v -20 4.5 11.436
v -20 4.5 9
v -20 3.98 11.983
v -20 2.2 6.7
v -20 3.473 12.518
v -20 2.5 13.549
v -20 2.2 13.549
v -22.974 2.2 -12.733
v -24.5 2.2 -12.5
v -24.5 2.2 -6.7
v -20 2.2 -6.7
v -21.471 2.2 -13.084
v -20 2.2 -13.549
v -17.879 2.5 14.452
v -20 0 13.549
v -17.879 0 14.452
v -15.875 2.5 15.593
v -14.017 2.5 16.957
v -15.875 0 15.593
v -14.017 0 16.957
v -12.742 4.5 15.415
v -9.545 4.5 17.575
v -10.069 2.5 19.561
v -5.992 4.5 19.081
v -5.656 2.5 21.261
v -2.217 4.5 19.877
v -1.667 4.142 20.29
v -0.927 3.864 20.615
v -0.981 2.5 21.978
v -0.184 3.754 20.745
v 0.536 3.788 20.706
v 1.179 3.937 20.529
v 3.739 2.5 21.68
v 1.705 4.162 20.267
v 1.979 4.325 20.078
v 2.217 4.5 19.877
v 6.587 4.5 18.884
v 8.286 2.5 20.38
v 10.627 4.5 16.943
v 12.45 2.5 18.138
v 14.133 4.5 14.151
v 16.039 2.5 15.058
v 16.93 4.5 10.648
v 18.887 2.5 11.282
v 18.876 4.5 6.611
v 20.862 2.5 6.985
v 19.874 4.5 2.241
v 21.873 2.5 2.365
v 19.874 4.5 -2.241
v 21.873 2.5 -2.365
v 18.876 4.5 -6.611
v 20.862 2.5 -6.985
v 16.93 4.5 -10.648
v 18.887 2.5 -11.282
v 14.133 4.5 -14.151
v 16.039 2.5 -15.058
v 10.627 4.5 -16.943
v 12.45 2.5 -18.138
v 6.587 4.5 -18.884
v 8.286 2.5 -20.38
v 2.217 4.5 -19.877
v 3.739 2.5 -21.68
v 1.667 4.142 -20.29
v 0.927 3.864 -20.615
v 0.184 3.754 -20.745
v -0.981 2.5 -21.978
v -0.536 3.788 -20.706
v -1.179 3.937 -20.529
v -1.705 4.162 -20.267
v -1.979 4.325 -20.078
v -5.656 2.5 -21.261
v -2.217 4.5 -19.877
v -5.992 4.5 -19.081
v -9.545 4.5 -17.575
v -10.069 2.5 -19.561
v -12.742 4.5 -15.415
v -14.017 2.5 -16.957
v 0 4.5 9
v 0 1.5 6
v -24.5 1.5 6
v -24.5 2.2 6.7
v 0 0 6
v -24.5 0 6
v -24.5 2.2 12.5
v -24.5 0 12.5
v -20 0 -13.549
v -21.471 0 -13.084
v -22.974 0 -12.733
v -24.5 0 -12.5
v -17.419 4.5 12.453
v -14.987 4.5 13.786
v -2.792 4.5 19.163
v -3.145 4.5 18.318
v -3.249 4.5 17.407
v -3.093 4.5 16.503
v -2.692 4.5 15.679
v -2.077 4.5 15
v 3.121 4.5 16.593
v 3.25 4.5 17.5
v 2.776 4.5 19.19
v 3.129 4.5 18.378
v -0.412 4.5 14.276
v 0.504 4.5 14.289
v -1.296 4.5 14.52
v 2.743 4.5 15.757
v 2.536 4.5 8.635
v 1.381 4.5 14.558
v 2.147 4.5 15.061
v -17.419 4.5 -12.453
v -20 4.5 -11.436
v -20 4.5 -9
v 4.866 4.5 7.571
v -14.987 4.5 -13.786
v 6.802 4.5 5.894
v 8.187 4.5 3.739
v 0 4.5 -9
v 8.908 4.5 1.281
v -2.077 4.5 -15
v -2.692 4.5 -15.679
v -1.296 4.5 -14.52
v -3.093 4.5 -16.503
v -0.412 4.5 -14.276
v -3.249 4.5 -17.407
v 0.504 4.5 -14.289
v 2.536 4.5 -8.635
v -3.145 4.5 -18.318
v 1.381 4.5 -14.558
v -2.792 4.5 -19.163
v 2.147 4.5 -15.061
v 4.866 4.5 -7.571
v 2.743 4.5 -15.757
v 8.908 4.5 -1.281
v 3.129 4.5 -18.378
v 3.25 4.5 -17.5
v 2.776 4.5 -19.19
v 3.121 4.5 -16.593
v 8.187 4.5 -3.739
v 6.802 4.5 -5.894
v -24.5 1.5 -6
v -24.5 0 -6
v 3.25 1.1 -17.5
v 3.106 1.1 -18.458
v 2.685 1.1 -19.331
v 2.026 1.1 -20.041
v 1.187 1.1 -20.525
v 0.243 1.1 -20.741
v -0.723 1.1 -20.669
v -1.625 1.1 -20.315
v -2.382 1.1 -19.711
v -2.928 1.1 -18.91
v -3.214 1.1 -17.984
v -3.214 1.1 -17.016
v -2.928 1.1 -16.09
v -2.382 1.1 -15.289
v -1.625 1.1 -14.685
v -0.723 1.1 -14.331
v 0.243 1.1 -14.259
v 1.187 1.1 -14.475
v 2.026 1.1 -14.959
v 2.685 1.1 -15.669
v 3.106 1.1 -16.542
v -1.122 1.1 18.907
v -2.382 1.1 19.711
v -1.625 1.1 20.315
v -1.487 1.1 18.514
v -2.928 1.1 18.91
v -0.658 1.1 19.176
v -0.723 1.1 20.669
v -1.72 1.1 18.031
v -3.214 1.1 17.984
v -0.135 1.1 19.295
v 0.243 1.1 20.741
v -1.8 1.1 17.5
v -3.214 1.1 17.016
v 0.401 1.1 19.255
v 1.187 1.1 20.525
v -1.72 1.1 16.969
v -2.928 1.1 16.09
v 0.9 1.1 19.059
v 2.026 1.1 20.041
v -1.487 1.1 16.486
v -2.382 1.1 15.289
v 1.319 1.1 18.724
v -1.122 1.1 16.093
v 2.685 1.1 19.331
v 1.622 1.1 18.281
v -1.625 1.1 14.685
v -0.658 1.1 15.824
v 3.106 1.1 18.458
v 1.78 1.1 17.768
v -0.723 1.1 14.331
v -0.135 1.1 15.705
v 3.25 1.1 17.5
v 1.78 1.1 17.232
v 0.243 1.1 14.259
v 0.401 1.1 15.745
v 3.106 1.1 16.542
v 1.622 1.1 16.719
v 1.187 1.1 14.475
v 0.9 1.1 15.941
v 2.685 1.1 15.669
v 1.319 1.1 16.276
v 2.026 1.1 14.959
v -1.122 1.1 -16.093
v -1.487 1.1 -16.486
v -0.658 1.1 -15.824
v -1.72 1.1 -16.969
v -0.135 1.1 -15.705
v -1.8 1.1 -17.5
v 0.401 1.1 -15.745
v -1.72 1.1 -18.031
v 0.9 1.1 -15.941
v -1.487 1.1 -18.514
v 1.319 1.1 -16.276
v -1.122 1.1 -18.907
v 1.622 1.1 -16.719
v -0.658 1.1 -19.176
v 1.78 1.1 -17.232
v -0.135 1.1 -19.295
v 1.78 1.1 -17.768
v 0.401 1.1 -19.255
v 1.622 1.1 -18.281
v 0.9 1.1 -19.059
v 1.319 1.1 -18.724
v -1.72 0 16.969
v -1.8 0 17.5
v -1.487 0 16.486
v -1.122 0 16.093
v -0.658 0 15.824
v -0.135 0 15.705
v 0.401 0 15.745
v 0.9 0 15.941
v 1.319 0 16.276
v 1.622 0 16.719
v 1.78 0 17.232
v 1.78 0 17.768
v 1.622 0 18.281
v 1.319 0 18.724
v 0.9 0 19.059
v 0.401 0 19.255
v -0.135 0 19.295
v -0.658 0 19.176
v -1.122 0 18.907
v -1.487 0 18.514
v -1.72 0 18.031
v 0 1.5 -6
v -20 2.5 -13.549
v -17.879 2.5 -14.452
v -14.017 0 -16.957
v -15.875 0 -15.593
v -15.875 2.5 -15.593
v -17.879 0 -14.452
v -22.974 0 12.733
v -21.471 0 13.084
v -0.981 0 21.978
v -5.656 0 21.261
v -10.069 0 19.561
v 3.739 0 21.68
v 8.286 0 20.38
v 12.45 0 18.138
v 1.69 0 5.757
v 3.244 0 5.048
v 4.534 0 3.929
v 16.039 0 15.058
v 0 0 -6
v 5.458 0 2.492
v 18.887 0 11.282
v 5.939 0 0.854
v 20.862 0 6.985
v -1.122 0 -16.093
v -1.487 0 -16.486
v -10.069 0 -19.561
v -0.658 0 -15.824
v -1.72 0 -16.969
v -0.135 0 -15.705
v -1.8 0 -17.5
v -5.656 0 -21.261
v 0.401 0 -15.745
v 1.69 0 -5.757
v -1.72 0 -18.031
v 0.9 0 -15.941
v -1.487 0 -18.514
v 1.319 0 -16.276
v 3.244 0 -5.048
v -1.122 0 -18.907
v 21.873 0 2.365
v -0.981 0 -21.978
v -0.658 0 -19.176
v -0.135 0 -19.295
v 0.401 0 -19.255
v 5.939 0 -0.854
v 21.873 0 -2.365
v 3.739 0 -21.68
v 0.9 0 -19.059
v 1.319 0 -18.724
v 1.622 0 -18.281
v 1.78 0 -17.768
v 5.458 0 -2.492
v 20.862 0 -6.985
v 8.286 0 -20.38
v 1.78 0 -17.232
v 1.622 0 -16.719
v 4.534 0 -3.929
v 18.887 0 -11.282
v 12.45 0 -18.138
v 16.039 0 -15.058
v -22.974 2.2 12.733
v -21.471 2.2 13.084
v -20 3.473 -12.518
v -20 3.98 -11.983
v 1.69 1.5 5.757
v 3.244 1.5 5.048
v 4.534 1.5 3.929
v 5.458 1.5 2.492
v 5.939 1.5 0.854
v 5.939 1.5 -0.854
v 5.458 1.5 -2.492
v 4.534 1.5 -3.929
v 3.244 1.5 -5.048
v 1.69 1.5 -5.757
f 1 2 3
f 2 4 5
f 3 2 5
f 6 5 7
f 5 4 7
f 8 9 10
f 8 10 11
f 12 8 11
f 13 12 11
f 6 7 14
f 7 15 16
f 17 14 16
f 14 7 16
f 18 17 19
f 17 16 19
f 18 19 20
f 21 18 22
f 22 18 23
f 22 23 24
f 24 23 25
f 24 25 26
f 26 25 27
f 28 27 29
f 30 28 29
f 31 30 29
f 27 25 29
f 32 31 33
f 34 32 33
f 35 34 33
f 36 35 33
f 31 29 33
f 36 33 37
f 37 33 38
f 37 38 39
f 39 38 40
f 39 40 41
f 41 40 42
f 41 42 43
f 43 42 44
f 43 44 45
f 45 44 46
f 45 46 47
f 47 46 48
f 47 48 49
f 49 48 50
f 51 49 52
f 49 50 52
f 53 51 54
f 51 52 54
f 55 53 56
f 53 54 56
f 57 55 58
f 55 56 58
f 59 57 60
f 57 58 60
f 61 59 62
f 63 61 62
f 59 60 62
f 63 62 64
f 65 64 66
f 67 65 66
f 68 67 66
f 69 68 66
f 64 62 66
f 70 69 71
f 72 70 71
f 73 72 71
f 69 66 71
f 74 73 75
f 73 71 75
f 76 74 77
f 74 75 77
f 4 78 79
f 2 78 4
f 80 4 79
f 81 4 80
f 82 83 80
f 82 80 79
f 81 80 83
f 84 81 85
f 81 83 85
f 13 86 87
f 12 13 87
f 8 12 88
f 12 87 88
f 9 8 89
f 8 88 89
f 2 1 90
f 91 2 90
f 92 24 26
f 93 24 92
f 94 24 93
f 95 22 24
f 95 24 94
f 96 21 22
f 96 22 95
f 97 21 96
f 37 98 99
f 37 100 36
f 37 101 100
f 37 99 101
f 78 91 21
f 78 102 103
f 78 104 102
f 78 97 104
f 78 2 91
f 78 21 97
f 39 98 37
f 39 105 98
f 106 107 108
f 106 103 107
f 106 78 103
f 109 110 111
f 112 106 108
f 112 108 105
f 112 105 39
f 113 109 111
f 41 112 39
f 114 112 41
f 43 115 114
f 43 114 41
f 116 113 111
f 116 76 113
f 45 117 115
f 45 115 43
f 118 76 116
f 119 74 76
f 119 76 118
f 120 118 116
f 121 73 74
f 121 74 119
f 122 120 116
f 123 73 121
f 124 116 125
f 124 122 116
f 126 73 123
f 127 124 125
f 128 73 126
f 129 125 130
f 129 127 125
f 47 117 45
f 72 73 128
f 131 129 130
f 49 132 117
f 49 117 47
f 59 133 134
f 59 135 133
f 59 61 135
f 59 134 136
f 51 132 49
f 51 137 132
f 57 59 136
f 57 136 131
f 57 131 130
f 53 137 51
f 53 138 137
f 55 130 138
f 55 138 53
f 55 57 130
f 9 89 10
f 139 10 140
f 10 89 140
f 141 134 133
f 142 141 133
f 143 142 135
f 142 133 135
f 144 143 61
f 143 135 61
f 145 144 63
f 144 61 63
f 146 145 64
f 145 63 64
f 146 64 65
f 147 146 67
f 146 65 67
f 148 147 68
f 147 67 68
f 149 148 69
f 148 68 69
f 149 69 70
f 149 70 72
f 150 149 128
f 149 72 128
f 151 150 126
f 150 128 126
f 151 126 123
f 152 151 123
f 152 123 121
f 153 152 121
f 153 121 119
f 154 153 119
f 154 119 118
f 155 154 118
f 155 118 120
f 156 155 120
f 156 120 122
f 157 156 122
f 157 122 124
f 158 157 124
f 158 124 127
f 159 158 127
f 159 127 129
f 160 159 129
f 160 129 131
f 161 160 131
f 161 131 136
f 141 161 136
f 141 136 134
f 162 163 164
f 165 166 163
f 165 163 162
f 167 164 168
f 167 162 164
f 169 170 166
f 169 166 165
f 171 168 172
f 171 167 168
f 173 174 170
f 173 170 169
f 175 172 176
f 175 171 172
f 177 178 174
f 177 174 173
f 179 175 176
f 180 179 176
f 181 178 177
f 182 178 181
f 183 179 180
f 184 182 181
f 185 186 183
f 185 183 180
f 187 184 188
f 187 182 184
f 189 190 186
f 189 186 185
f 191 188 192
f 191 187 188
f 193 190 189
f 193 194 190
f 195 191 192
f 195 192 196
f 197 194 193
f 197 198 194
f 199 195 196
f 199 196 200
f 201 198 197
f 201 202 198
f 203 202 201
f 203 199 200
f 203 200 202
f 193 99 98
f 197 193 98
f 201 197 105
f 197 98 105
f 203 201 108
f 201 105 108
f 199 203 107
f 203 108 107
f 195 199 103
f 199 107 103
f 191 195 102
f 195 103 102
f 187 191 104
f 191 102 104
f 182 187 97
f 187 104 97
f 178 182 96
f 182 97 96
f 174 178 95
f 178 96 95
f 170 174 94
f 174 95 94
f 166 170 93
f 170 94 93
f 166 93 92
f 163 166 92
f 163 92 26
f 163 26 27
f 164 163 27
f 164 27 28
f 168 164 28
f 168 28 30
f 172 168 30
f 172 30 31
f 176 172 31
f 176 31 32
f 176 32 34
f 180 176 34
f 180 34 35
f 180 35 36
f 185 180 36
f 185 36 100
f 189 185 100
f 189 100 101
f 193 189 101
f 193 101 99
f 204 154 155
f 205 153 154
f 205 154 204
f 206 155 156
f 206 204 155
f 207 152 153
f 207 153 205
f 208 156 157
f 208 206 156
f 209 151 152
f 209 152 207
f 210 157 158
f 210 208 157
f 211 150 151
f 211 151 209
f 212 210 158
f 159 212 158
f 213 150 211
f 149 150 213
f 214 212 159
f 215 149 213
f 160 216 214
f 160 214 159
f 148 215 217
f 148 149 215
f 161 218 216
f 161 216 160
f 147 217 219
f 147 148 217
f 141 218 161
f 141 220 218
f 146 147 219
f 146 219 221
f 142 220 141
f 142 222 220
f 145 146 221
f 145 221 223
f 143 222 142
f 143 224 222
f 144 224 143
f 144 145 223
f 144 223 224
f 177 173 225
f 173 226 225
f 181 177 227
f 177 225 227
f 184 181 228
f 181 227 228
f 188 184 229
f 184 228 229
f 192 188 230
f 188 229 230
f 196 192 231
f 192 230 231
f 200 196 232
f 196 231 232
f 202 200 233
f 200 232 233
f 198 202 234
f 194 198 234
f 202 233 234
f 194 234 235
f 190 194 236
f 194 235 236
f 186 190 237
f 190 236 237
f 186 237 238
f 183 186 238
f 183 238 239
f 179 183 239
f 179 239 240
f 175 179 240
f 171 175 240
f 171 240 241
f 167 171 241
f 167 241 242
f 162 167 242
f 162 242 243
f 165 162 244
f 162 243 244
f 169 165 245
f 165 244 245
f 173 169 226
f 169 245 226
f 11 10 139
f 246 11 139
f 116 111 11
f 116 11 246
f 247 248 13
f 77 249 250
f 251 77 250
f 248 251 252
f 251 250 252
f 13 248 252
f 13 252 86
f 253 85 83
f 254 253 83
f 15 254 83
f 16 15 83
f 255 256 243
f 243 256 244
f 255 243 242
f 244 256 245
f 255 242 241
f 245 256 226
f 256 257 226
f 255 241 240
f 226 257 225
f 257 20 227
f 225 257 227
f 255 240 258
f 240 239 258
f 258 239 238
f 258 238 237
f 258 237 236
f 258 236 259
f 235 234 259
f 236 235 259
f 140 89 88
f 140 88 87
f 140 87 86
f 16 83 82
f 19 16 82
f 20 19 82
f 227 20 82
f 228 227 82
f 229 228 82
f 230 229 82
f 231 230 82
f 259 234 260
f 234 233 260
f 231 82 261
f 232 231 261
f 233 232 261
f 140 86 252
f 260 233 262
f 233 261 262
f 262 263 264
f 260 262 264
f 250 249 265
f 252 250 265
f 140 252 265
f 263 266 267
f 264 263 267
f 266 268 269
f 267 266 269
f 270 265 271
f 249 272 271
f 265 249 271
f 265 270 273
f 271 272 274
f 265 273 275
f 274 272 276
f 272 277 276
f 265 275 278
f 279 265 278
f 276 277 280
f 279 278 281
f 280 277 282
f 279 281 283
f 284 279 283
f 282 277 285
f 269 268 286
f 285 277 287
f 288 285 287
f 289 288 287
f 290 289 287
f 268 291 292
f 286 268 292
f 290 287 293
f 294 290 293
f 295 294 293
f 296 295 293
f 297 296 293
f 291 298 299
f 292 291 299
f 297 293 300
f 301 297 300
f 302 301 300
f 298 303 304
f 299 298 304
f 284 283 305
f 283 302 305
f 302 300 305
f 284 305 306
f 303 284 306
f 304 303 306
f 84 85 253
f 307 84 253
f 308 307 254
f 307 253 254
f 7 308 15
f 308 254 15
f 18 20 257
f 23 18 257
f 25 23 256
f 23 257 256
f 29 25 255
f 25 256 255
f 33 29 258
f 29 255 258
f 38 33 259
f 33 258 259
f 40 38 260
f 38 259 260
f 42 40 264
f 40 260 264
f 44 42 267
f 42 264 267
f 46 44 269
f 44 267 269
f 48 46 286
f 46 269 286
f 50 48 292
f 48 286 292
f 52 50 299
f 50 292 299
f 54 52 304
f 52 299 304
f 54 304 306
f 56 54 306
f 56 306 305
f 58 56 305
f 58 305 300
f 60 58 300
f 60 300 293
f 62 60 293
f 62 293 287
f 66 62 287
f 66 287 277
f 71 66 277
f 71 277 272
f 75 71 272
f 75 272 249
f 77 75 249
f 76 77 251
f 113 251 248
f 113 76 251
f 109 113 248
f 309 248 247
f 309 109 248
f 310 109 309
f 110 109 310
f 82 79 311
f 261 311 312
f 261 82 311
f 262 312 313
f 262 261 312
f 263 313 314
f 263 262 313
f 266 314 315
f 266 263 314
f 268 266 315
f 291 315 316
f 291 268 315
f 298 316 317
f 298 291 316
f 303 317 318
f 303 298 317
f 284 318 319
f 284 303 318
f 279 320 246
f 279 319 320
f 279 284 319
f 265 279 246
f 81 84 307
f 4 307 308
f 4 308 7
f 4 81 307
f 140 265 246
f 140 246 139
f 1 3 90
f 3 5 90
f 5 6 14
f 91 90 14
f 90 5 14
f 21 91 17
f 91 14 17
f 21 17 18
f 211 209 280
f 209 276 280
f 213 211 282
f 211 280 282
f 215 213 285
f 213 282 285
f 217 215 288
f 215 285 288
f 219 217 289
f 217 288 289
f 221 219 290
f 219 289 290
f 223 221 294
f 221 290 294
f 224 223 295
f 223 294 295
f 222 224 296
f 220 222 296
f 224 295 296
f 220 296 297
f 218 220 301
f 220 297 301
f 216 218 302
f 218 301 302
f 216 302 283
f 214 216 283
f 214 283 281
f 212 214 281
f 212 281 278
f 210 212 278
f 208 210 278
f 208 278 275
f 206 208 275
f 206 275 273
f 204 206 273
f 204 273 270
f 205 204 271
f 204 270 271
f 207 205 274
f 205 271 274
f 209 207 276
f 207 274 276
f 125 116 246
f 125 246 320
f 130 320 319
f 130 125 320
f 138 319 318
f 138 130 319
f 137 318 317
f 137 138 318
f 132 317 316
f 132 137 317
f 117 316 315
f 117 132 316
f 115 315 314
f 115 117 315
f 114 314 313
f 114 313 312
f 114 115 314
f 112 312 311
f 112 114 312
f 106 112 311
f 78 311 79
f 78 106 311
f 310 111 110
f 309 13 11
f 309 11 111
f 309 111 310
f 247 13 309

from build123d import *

# Parameters (mm, degrees)
BOSS_EXTRUDE1_DEPTH                                 = 4.5
CUT_EXTRUDE1_DEPTH                                  = 43.552908244
CUT_EXTRUDE1_DEPTH_BACK                             = 43.552908244
SKETCH2_W                                           = 4.5
SKETCH2_H                                           = 2.3
CUT_EXTRUDE2_DEPTH                                  = 34.234018716
CUT_EXTRUDE2_DEPTH_BACK                             = 34.234018716
CBORE_FOR_M3_HEX_SOCKET_HEAD_CAP_SCREW1_D           = 3.6
CBORE_FOR_M3_HEX_SOCKET_HEAD_CAP_SCREW1_CBORE_D     = 6.5
CBORE_FOR_M3_HEX_SOCKET_HEAD_CAP_SCREW1_CBORE_DEPTH = 3.4
FILLET2_DEPTH                                       = 4.5
FILLET2_2_DEPTH                                     = 2.2
CHAMFER1_SIZE                                       = 3
CHAMFER2_SIZE                                       = 2


with BuildPart() as part:
    # Sketch1 → Boss-Extrude1 (new body)
    with BuildSketch(Plane(origin=(0, 0, 0), x_dir=(1, 0, 0), z_dir=(0, 1, 0))):
        with BuildLine():
            Line((-18.10386699, 12.5), (-24.5, 12.5))
            Line((-24.5, 12.5), (-24.5, -12.5))
            Line((-24.5, -12.5), (-18.10386699, -12.5))
            ThreePointArc((-18.10386699, -12.5), (22, 0), (-18.10386699, 12.5))
        make_face()
    extrude(amount=BOSS_EXTRUDE1_DEPTH)

    # Sketch2 → Cut-Extrude1 (cut, two sides: drawn at the far end of the back side and taken through both)
    with BuildSketch(Plane.XY.offset(12.5).offset(-CUT_EXTRUDE1_DEPTH_BACK)):
        with Locations((-22.25, 3.35)):
            Rectangle(SKETCH2_W, SKETCH2_H)
    extrude(amount=CUT_EXTRUDE1_DEPTH + CUT_EXTRUDE1_DEPTH_BACK, mode=Mode.SUBTRACT)

    # Sketch3 → Cut-Extrude2 (cut, two sides: drawn at the far end of the back side and taken through both)
    with BuildSketch(Plane(origin=(0, 4.5, 0), x_dir=(1, 0, 0), z_dir=(0, 1, 0)).offset(-CUT_EXTRUDE2_DEPTH_BACK)):
        with BuildLine():
            Line((0, 6), (-24.5, 6))
            Line((-24.5, 6), (-24.5, -6))
            Line((-24.5, -6), (0, -6))
            ThreePointArc((0, -6), (6, 0), (0, 6))
        make_face()
    extrude(amount=CUT_EXTRUDE2_DEPTH + CUT_EXTRUDE2_DEPTH_BACK, mode=Mode.SUBTRACT)

    # CBORE for M3 Hex Socket Head Cap Screw1 (through all)
    with Locations(Plane(origin=(0, 4.5, 0), x_dir=(1, 0, 0), z_dir=(0, 1, 0))):
        with Locations((0, -17.5), (0, 17.5)):
            CounterBoreHole(CBORE_FOR_M3_HEX_SOCKET_HEAD_CAP_SCREW1_D / 2, CBORE_FOR_M3_HEX_SOCKET_HEAD_CAP_SCREW1_CBORE_D / 2, CBORE_FOR_M3_HEX_SOCKET_HEAD_CAP_SCREW1_CBORE_DEPTH)

    # Fillet2: read off the stored shape, not the designer's step
    # Fillet2 outline → Fillet2 (add)
    with BuildSketch(Plane(origin=(0, 0, 0), x_dir=(1, 0, 0), z_dir=(0, 1, 0))):
        with BuildLine():
            Line((-18.10386699, -12.5), (-20, -12.5))
            Line((-20, -12.5), (-20, -13.548778219))
            ThreePointArc((-20, -13.548778219), (-16.860589429, -14.993334166), (-14.016717362, -16.956757779))
            ThreePointArc((-14.016717362, -16.956757779), (-16.214149909, -14.869476882), (-18.10386699, -12.5))
        make_face()
        with BuildLine():
            ThreePointArc((-18.10386699, 12.5), (-16.214149909, 14.869476882), (-14.016717362, 16.956757779))
            ThreePointArc((-14.016717362, 16.956757779), (-16.860589429, 14.993334166), (-20, 13.548778219))
            Line((-20, 13.548778219), (-20, 12.5))
            Line((-20, 12.5), (-18.10386699, 12.5))
        make_face()
    extrude(amount=FILLET2_DEPTH)

    # Fillet2 2 outline → Fillet2 2 (add)
    with BuildSketch(Plane(origin=(0, 0, 0), x_dir=(1, 0, 0), z_dir=(0, 1, 0))):
        with BuildLine():
            Line((-20, -13.548778219), (-20, -12.5))
            Line((-20, -12.5), (-24.5, -12.5))
            ThreePointArc((-24.5, -12.5), (-22.219610886, -12.893998326), (-20, -13.548778219))
        make_face()
        with BuildLine():
            Line((-20, 12.5), (-20, 13.548778219))
            ThreePointArc((-20, 13.548778219), (-22.219610886, 12.893998326), (-24.5, 12.5))
            Line((-24.5, 12.5), (-20, 12.5))
        make_face()
    extrude(amount=FILLET2_2_DEPTH)

    # Chamfer1
    chamfer1_edges = [part.edges().sort_by_distance(p)[0] for p in [
        (-10, 4.5, 6),
        (-10, 4.5, -6),
        (6, 4.5, 0),
    ]]
    chamfer(chamfer1_edges, length=CHAMFER1_SIZE)

    # Chamfer2
    # the kernel refuses this chamfer: 2 mm, written as the material it takes off along each edge
    with BuildSketch(Plane(origin=(0, 4.5, 0), x_dir=(-0.6371235164664789, 0, 0.7707617172417092), z_dir=(-0.7707617172417092, 0, -0.6371235164664789))) as chamfer2_piece_1:
        Polygon((22 - CHAMFER2_SIZE, 0), (22, -CHAMFER2_SIZE), (22, 0), align=None)
    revolve(axis=Axis((0, 4.5, 0), (0, 1, 0)), revolution_arc=259.155320495, mode=Mode.SUBTRACT)
    with BuildSketch(Plane(origin=(-26.75918769, 4.5, -32.371992129), x_dir=(0.6371235163113105, 0, 0.7707617173699738), z_dir=(0.7707617173699738, 0, -0.6371235163113105))) as chamfer2_piece_2:
        Polygon((20.000000004, CHAMFER2_SIZE), (20.000000004 + CHAMFER2_SIZE, 0), (20.000000004, 0), align=None)
    revolve(axis=Axis((-26.75918769, 4.5, -32.371992129), (0, -1, 0)), revolution_arc=34.56000809, mode=Mode.SUBTRACT)
    with BuildSketch(Plane(origin=(-26.75918769, 4.5, 32.371992129), x_dir=(0.08746265429711, 0, -0.9961677991700516), z_dir=(-0.9961677991700516, 0, -0.08746265429711))) as chamfer2_piece_3:
        Polygon((20.000000004 + CHAMFER2_SIZE, 0), (20.000000004, CHAMFER2_SIZE), (20.000000004, 0), align=None)
    revolve(axis=Axis((-26.75918769, 4.5, 32.371992129), (0, -1, 0)), revolution_arc=34.56000809, mode=Mode.SUBTRACT)


solid = part.part
